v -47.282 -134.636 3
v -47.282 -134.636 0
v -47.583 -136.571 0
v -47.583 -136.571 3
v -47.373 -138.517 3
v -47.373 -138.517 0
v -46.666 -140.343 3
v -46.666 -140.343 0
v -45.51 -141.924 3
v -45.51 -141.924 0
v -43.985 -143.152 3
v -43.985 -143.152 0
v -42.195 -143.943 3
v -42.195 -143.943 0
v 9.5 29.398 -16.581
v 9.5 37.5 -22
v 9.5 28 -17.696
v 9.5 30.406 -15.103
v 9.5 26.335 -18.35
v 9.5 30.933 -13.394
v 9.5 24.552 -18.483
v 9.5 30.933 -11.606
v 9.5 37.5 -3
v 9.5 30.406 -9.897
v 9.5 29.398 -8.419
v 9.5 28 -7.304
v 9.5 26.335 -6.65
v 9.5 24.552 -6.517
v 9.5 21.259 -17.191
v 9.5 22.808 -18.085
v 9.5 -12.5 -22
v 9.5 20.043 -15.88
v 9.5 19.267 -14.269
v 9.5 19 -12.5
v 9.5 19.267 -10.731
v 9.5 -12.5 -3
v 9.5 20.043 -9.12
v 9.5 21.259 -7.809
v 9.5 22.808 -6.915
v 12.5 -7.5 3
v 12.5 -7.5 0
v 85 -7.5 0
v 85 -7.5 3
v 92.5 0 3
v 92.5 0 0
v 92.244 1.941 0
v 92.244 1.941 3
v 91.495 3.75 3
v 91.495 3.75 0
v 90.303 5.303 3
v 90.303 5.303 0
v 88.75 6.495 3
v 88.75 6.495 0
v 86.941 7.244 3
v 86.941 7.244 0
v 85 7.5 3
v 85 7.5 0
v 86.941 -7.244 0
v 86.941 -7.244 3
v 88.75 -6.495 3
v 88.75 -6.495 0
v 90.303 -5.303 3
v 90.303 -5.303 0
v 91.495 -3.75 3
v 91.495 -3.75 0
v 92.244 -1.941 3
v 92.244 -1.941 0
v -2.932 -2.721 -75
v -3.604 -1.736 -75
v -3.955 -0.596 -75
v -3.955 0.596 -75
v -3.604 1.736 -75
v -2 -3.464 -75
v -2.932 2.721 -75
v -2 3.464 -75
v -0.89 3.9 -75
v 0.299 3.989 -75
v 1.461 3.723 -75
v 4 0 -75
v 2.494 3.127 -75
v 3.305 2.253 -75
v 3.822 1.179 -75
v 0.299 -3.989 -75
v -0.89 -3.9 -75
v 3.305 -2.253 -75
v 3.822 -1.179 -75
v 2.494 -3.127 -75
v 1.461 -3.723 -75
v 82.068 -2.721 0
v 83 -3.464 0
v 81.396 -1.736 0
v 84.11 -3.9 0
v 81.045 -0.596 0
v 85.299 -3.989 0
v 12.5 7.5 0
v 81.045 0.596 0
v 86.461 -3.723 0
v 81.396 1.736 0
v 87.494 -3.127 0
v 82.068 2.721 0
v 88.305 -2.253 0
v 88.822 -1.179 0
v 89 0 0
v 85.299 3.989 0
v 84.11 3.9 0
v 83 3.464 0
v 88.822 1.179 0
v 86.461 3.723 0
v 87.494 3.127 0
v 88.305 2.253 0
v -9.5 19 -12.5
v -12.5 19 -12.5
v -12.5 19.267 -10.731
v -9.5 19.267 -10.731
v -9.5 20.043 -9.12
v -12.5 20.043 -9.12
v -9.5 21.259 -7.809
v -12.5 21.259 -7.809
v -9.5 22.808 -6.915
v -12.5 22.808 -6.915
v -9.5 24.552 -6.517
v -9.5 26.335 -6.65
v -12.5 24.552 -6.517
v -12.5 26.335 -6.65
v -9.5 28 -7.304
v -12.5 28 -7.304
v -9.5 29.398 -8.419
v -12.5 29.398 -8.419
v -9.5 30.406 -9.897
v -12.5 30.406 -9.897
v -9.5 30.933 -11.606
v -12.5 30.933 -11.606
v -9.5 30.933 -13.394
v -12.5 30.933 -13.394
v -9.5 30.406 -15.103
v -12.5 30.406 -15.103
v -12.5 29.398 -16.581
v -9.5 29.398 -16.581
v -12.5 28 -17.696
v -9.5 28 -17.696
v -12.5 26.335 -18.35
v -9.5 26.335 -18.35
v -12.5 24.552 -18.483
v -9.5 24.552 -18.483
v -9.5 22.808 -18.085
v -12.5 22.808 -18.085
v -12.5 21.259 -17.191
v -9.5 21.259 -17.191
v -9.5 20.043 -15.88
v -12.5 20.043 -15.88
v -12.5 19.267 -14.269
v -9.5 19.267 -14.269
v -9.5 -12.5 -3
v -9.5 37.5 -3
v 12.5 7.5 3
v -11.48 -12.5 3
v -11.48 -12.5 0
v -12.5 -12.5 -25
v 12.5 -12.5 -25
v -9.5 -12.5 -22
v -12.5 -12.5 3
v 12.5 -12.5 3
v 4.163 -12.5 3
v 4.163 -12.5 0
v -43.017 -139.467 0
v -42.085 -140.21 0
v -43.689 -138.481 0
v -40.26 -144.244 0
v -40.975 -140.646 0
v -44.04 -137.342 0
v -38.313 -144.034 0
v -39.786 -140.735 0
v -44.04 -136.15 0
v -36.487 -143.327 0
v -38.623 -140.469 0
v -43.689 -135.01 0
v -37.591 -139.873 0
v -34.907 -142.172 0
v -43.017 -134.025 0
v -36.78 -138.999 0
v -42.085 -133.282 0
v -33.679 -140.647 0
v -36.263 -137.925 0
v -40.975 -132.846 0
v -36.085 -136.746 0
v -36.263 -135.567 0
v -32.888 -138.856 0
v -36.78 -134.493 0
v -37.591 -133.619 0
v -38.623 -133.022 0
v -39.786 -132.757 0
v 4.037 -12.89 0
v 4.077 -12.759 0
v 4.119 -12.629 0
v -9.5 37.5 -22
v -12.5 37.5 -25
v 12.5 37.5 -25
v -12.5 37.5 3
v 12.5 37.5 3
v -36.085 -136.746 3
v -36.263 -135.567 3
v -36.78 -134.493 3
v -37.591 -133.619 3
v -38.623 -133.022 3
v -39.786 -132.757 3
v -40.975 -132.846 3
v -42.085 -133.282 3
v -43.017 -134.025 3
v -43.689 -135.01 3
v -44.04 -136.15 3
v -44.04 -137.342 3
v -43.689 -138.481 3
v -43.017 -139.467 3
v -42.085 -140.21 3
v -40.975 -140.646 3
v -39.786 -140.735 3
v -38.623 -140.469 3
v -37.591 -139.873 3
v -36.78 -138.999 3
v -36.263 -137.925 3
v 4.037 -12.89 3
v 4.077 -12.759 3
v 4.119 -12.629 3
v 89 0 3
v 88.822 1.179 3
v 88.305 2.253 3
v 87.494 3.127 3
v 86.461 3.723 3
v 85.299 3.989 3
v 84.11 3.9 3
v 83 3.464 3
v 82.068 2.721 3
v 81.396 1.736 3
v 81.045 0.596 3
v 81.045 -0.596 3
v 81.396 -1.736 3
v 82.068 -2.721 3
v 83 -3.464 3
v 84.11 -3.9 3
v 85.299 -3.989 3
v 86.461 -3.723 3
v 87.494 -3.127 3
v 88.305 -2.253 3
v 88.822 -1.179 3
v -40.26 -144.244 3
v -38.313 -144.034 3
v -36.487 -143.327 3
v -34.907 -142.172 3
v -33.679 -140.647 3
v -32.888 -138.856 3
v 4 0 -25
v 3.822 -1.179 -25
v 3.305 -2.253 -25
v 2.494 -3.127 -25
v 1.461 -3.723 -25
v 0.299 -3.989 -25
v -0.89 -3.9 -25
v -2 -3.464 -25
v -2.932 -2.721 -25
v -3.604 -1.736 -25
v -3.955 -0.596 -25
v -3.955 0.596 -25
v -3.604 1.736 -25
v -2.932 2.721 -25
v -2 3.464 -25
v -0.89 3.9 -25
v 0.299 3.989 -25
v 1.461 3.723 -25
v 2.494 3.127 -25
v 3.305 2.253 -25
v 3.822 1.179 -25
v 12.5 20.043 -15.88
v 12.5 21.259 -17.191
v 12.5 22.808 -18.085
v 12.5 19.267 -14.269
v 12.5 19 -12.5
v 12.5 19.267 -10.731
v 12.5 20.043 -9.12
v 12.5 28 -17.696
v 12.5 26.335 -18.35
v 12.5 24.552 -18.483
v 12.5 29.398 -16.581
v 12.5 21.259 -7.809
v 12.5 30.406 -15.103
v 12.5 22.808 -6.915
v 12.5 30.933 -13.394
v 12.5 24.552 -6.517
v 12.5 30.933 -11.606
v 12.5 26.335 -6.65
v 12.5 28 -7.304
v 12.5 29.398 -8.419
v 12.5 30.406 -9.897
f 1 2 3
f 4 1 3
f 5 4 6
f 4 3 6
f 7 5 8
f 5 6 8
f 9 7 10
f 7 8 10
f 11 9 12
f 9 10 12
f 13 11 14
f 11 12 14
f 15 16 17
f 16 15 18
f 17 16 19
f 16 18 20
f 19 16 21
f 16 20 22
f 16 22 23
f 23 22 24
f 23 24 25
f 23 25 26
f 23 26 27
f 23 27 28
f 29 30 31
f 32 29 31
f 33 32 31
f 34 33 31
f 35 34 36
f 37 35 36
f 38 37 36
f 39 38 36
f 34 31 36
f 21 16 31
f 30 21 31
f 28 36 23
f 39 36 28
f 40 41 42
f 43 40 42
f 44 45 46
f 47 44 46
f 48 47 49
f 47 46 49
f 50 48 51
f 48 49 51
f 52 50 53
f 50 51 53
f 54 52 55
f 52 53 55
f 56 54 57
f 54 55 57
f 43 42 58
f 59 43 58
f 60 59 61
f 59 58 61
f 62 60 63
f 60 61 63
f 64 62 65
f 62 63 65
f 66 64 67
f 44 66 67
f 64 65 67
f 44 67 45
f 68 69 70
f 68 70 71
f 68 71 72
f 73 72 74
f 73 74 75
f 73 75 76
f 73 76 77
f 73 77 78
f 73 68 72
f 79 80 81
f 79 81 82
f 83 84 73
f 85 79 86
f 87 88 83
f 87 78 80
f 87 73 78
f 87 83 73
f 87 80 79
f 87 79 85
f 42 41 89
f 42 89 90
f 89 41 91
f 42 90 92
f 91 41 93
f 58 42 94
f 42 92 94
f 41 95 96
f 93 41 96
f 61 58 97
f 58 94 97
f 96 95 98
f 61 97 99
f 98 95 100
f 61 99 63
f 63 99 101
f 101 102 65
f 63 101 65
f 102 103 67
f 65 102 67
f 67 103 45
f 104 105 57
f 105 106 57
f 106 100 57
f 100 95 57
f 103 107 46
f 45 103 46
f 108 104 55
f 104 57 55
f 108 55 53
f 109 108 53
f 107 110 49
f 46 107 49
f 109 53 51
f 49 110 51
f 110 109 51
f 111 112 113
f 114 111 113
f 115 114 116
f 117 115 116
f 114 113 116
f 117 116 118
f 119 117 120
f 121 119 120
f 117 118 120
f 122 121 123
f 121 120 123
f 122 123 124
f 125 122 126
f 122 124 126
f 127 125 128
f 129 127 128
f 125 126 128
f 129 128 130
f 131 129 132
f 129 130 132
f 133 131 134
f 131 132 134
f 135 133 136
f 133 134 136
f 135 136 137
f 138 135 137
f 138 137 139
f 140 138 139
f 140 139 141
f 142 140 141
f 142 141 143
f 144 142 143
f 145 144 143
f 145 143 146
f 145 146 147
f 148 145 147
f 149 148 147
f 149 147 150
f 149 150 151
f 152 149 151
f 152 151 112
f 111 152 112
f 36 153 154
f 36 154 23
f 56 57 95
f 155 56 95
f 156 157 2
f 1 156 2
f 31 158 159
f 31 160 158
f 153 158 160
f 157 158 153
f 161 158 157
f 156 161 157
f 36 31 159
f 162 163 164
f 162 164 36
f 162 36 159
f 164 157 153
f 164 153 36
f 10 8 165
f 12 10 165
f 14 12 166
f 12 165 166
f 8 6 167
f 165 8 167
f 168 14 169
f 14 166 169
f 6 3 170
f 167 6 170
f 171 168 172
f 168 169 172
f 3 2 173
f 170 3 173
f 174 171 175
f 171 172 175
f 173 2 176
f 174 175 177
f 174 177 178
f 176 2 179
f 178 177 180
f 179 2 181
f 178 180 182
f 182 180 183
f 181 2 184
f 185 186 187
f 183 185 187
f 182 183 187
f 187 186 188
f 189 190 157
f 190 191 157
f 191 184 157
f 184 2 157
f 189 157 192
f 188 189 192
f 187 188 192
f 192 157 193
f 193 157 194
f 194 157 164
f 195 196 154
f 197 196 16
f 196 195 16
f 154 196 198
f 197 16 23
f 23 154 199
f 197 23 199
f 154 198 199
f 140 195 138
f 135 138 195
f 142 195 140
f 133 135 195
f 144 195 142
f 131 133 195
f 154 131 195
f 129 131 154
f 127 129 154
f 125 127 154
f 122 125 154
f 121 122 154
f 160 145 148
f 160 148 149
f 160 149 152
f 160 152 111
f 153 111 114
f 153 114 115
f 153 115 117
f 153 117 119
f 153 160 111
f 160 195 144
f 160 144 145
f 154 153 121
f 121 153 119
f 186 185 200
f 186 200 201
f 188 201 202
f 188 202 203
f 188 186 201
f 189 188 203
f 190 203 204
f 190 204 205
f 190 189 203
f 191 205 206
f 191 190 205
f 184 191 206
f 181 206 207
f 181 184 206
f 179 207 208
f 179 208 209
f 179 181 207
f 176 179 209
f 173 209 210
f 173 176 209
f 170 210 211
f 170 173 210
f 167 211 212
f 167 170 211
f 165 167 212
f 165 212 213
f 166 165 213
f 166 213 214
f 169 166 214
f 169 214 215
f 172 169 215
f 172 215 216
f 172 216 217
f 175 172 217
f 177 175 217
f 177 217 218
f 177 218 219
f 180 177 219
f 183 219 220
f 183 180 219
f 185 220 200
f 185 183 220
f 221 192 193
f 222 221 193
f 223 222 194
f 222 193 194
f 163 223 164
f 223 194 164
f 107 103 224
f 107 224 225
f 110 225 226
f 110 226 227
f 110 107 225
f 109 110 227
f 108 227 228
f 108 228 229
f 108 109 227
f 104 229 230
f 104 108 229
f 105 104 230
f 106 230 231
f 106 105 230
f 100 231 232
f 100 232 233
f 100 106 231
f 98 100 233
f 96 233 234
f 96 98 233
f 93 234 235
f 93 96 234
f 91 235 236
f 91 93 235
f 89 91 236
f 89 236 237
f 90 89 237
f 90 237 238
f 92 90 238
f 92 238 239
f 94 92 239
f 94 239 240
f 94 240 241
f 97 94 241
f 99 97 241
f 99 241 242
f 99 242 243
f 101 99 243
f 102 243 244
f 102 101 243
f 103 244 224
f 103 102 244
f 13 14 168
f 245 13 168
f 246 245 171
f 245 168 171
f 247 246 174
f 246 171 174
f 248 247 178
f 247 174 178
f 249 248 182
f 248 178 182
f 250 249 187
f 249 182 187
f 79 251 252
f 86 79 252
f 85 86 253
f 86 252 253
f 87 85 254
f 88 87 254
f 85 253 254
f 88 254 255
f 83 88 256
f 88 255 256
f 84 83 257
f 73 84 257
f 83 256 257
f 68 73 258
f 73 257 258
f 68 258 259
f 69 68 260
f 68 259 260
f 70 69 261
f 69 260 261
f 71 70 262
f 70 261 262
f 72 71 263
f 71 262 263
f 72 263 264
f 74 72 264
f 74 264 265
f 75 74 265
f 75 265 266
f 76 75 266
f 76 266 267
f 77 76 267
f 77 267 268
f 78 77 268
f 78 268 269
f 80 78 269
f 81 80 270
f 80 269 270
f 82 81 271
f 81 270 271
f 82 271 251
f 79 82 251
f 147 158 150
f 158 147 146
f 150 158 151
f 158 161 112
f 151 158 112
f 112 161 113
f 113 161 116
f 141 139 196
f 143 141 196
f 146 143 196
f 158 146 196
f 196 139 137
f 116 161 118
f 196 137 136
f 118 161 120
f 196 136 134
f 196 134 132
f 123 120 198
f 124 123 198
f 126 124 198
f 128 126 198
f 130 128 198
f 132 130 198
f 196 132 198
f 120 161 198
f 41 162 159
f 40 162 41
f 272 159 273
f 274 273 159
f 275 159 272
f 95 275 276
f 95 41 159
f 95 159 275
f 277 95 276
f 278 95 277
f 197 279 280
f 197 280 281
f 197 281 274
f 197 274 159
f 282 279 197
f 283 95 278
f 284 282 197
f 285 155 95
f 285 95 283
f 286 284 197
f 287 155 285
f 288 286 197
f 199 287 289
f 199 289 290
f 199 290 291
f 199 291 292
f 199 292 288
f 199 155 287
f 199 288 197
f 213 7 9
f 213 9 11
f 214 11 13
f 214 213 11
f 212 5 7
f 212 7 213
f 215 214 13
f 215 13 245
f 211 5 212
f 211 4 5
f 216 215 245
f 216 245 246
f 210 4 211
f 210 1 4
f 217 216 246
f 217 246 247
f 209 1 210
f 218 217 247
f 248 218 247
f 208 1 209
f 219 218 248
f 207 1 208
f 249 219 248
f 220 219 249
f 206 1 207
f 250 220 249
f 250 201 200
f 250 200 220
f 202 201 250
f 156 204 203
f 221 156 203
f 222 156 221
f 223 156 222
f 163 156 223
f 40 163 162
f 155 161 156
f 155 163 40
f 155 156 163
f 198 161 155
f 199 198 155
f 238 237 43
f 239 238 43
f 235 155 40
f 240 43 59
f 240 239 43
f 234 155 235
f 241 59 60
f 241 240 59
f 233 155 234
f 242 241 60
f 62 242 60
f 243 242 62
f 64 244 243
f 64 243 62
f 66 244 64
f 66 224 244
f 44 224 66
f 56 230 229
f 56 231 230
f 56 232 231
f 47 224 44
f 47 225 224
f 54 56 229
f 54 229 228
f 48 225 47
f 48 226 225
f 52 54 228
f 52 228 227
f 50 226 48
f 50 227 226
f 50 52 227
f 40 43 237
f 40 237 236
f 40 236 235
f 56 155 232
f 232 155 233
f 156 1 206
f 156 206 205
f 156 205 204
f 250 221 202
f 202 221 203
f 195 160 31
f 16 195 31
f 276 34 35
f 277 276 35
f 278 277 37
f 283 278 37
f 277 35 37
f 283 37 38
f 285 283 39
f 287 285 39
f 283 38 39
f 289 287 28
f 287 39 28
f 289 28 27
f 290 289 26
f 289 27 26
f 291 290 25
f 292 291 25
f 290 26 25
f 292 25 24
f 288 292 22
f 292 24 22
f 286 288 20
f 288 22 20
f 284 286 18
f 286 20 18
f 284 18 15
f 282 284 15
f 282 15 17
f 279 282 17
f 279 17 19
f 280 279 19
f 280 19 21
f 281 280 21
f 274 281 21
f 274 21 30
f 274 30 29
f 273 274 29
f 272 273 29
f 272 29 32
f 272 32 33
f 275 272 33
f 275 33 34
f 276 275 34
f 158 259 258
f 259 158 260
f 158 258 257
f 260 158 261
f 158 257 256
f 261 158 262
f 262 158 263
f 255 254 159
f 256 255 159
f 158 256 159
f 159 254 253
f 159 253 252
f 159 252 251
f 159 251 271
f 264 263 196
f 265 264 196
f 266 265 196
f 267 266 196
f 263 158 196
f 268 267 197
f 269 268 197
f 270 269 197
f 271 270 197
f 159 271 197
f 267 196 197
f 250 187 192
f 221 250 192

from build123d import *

# Parameters (mm, degrees)
F0_R     = 4
F1_DEPTH = 3
F2_W     = 25
F2_H     = 50
F3_DEPTH = 28
F5_R     = 6
F6_DEPTH = 25
F7_W     = 19
F7_H     = 19
F8_DEPTH = 50
F4_R     = 4
F9_DEPTH = 50


with BuildPart() as f1:
    # F0 (on Top) → F1 (new body)
    with BuildSketch(Plane.XY):
        with BuildLine():
            Line((85, 7.5), (12.5, 7.5))
            Line((12.5, 7.5), (12.5, 37.5))
            Line((12.5, 37.5), (-12.5, 37.5))
            Line((-12.5, 37.5), (-12.5, -12.5))
            Line((-12.5, -12.5), (-11.479756, -12.5))
            Line((-11.479756, -12.5), (-47.281972, -134.636232))
            ThreePointArc((-47.281972, -134.636232), (-46.665777, -140.343315), (-42.194544, -143.943115))
            ThreePointArc((-42.194544, -143.943115), (-36.487461, -143.32692), (-32.887661, -138.855687))
            Line((-32.887661, -138.855687), (4.037017, -12.890273))
            ThreePointArc((4.037017, -12.890273), (4.097393, -12.694274), (4.163105, -12.5))
            Line((4.163105, -12.5), (12.5, -12.5))
            Line((12.5, -12.5), (12.5, -7.5))
            Line((12.5, -7.5), (85, -7.5))
            ThreePointArc((85, -7.5), (90.303301, -5.303301), (92.5, 0))
            ThreePointArc((92.5, 0), (90.303301, 5.303301), (85, 7.5))
        make_face()
        with Locations((-40.084816, -136.74596)):
            Circle(F0_R, mode=Mode.SUBTRACT)
        with Locations((85, 0)):
            Circle(F0_R, mode=Mode.SUBTRACT)
    extrude(amount=F1_DEPTH)

    # F2 (on face) → F3 (join)
    with BuildSketch(Plane.XY.offset(3)):
        with Locations((0, 12.5)):
            Rectangle(F2_W, F2_H)
    extrude(amount=-F3_DEPTH)

    # F5 (on face) → F6 (cut)
    with BuildSketch(Plane(origin=(-12.5, 0, 0), x_dir=(0, -1, 0), z_dir=(-1, 0, 0))):
        with Locations((-25, -12.5)):
            Circle(F5_R)
    extrude(amount=-F6_DEPTH, mode=Mode.SUBTRACT)

    # F7 (on face) → F8 (cut)
    with BuildSketch(Plane.XZ.offset(12.5)):
        with Locations((0, -12.5)):
            Rectangle(F7_W, F7_H)
    extrude(amount=-F8_DEPTH, mode=Mode.SUBTRACT)

    # F4 (on face) → F9 (join)
    with BuildSketch(Plane(origin=(0, 0, -25), x_dir=(1, 0, 0), z_dir=(0, 0, -1))):
        Circle(F4_R)
    extrude(amount=F9_DEPTH)


solid = f1.part
